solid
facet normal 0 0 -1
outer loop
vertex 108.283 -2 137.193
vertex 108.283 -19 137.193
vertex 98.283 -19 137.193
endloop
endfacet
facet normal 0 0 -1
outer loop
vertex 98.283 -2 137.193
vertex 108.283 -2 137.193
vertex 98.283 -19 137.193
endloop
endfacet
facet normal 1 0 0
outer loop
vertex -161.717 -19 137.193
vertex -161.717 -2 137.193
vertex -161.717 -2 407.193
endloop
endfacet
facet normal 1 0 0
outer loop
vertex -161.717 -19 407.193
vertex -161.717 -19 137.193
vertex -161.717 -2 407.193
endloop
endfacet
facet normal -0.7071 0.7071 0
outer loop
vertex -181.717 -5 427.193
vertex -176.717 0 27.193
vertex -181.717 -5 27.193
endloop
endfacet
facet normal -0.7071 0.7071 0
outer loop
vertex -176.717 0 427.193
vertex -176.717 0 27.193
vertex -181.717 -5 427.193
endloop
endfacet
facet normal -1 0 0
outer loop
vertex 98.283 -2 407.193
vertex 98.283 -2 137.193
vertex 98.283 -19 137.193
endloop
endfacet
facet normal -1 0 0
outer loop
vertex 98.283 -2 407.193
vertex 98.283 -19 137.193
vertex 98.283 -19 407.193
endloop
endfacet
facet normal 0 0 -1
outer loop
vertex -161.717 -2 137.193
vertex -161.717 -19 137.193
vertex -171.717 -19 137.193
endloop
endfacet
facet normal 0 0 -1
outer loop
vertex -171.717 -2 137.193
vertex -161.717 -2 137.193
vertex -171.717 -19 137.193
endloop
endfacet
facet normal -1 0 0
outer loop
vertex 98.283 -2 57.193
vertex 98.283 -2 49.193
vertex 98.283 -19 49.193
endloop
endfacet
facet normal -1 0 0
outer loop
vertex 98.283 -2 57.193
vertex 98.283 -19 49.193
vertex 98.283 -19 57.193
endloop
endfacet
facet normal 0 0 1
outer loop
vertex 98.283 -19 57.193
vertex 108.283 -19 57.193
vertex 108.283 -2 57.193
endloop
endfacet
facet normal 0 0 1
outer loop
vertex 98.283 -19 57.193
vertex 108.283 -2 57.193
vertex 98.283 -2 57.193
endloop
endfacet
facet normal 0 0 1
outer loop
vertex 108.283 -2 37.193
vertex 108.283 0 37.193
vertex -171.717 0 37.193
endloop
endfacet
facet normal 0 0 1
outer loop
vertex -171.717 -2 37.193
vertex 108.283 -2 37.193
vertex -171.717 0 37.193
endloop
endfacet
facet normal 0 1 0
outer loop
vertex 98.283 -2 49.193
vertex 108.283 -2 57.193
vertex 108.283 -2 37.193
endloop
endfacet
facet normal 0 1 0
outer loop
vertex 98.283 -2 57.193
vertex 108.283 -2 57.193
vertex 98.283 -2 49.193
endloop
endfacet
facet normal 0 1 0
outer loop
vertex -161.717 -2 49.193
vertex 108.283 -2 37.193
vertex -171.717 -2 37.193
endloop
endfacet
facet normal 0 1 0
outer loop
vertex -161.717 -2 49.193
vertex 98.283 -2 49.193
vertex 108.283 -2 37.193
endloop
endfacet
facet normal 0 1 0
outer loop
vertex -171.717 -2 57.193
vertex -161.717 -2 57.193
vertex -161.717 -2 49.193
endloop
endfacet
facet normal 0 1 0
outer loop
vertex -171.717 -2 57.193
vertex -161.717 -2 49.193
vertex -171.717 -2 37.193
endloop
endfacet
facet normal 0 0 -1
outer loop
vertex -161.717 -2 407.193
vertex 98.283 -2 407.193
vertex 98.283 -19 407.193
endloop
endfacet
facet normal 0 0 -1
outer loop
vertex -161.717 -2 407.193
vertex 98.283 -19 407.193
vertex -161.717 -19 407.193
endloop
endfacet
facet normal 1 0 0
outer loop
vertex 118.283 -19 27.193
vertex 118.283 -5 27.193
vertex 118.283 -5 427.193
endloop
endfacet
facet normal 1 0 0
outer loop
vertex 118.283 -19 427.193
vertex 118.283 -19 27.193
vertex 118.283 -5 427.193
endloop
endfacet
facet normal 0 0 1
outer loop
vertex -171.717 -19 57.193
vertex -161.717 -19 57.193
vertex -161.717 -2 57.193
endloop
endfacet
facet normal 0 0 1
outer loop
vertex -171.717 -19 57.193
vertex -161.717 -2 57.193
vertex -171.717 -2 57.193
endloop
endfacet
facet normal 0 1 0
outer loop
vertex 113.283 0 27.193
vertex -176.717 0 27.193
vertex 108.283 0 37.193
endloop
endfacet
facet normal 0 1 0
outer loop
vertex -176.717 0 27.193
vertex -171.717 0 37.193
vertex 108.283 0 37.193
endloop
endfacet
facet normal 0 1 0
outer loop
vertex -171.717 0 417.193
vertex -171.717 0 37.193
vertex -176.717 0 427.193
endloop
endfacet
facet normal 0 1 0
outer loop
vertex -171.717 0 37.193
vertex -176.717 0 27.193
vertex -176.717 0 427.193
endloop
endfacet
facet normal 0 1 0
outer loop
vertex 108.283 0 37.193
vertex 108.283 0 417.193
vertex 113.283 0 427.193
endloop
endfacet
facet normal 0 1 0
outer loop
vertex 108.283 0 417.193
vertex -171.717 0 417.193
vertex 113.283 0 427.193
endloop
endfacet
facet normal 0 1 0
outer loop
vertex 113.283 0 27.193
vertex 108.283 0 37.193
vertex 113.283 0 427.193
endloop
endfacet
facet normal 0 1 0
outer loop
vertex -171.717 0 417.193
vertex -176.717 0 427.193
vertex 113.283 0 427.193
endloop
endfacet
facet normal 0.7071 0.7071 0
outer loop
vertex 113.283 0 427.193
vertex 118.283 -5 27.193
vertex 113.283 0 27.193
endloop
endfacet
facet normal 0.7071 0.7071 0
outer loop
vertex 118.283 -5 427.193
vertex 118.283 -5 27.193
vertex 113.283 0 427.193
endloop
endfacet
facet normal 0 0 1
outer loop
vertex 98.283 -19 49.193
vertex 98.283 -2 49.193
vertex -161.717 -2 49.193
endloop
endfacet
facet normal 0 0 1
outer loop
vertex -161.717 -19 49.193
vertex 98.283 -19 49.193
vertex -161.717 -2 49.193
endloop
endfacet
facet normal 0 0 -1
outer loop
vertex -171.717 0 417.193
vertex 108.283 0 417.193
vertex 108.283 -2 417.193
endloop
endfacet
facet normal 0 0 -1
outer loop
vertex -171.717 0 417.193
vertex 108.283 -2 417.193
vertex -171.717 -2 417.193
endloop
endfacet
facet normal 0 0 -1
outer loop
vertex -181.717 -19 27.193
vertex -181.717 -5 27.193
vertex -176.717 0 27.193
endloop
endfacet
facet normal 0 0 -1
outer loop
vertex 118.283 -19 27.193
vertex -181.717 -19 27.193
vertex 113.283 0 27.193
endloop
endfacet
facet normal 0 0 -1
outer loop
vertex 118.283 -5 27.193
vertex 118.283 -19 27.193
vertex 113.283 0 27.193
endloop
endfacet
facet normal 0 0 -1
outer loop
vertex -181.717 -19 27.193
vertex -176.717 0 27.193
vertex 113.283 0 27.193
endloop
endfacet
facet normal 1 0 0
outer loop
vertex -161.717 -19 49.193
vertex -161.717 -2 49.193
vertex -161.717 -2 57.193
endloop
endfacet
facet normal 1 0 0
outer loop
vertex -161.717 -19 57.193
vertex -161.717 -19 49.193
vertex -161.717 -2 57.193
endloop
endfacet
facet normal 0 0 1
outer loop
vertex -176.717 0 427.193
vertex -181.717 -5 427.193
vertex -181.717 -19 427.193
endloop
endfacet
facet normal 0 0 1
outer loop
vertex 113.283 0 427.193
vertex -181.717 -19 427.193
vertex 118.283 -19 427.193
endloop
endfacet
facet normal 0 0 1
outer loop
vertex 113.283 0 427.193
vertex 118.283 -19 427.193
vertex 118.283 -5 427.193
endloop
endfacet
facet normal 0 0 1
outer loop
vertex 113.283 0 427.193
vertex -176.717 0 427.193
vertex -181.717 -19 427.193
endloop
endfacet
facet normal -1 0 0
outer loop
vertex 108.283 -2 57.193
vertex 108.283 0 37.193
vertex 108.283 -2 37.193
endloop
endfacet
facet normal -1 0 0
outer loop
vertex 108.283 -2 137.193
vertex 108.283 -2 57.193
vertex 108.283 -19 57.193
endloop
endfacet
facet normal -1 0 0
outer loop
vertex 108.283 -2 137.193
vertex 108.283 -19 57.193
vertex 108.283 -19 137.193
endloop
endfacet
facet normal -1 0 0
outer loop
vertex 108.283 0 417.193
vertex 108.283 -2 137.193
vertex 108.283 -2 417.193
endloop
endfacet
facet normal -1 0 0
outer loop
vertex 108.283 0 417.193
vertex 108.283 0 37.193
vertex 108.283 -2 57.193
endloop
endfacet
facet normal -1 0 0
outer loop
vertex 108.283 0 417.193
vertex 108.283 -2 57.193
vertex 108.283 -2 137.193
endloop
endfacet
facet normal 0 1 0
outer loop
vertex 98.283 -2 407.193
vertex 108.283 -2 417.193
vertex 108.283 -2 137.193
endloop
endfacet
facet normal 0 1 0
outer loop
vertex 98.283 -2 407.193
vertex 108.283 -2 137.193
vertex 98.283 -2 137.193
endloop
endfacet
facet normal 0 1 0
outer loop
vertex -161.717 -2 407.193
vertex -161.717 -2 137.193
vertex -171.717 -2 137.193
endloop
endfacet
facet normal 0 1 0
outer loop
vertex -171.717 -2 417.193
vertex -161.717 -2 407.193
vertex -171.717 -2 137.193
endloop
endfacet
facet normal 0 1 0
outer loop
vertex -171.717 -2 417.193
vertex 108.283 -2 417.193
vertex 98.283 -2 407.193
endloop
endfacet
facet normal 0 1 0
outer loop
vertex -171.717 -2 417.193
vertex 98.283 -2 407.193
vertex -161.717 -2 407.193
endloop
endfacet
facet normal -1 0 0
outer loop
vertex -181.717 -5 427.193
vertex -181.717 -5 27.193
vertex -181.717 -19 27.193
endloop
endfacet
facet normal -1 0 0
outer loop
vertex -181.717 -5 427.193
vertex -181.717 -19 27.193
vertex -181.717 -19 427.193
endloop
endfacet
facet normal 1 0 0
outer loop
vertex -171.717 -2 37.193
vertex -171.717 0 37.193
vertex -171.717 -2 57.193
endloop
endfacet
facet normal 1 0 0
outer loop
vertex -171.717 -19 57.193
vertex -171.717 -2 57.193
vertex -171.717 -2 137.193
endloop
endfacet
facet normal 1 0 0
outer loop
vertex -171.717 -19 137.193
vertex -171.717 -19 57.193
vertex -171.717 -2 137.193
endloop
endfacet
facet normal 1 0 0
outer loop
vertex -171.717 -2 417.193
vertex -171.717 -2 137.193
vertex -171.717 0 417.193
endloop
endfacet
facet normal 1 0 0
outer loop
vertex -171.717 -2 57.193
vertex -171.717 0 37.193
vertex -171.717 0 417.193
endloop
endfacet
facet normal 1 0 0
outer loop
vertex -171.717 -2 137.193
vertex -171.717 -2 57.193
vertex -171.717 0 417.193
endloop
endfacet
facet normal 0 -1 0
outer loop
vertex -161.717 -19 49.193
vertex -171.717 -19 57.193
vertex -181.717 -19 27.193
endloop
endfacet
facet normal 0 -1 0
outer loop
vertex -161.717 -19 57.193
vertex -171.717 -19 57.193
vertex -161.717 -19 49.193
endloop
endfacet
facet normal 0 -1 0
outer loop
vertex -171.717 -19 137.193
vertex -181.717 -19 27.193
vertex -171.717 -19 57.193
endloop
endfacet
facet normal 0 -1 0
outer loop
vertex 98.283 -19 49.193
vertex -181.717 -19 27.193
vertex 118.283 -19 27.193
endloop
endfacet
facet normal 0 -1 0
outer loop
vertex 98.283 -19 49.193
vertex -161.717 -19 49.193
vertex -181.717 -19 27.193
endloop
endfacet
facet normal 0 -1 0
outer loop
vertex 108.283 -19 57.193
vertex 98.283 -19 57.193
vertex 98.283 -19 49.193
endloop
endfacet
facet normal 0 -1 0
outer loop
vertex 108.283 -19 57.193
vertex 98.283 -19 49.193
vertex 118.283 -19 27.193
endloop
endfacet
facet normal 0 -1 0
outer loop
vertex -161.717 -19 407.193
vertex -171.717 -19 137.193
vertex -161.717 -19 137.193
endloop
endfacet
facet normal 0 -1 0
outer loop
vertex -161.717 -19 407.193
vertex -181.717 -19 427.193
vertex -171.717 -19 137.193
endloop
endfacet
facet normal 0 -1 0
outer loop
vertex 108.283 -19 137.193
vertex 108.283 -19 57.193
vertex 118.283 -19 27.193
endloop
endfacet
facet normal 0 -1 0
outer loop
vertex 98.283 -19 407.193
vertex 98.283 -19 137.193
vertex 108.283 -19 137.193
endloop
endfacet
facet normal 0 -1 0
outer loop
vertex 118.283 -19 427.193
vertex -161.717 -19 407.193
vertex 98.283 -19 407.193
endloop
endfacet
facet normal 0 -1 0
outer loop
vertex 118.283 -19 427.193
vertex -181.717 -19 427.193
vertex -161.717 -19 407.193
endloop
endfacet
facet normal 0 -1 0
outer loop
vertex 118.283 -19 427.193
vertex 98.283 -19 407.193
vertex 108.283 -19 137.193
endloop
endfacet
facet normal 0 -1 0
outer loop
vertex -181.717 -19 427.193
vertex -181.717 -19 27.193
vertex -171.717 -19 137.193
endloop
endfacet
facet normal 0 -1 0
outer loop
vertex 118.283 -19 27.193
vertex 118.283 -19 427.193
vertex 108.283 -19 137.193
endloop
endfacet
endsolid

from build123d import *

# Parameters (mm, degrees)
F0_W      = 300
F0_H      = 400
F1_DEPTH  = 19
F2_W      = 280
F2_H      = 380
F3_DEPTH  = 2
F4_W      = 260
F4_H      = 358
F5_DEPTH  = 17
F6_SIZE   = 5
F7_W      = 10
F7_H      = 80
F8_DEPTH  = 17
F9_W      = 10
F9_H      = 80
F10_DEPTH = 17


with BuildPart() as f1:
    # F0 (on Front) → F1 (new body)
    with BuildSketch(Plane.XZ):
        with Locations((-31.717002, 227.192586)):
            Rectangle(F0_W, F0_H)
    extrude(amount=F1_DEPTH)

    # F2 (on face) → F3 (cut)
    with BuildSketch(Plane(origin=(0, 0, 0), x_dir=(-1, 0, 0), z_dir=(0, 1, 0))):
        with Locations((31.717002, 227.192586)):
            Rectangle(F2_W, F2_H)
    extrude(amount=-F3_DEPTH, mode=Mode.SUBTRACT)

    # F4 (on face) → F5 (cut)
    with BuildSketch(Plane(origin=(0, -2, 0), x_dir=(-1, 0, 0), z_dir=(0, 1, 0))):
        with Locations((31.717002, 228.192586)):
            Rectangle(F4_W, F4_H)
    extrude(amount=-F5_DEPTH, mode=Mode.SUBTRACT)

    # F6
    f6_edges = [f1.edges().sort_by_distance(p)[0] for p in [
        (118.282998, 0, 227.192586),
        (-181.717002, 0, 227.192586),
    ]]
    chamfer(f6_edges, length=F6_SIZE)

    # F7 (on face) → F8 (cut)
    with BuildSketch(Plane(origin=(0, -2, 0), x_dir=(-1, 0, 0), z_dir=(0, 1, 0))):
        with Locations((-103.282998, 97.192586)):
            Rectangle(F7_W, F7_H)
    extrude(amount=-F8_DEPTH, mode=Mode.SUBTRACT)

    # F9 (on face) → F10 (cut)
    with BuildSketch(Plane(origin=(0, -2, 0), x_dir=(-1, 0, 0), z_dir=(0, 1, 0))):
        with Locations((166.717002, 97.192586)):
            Rectangle(F9_W, F9_H)
    extrude(amount=-F10_DEPTH, mode=Mode.SUBTRACT)


solid = f1.part
